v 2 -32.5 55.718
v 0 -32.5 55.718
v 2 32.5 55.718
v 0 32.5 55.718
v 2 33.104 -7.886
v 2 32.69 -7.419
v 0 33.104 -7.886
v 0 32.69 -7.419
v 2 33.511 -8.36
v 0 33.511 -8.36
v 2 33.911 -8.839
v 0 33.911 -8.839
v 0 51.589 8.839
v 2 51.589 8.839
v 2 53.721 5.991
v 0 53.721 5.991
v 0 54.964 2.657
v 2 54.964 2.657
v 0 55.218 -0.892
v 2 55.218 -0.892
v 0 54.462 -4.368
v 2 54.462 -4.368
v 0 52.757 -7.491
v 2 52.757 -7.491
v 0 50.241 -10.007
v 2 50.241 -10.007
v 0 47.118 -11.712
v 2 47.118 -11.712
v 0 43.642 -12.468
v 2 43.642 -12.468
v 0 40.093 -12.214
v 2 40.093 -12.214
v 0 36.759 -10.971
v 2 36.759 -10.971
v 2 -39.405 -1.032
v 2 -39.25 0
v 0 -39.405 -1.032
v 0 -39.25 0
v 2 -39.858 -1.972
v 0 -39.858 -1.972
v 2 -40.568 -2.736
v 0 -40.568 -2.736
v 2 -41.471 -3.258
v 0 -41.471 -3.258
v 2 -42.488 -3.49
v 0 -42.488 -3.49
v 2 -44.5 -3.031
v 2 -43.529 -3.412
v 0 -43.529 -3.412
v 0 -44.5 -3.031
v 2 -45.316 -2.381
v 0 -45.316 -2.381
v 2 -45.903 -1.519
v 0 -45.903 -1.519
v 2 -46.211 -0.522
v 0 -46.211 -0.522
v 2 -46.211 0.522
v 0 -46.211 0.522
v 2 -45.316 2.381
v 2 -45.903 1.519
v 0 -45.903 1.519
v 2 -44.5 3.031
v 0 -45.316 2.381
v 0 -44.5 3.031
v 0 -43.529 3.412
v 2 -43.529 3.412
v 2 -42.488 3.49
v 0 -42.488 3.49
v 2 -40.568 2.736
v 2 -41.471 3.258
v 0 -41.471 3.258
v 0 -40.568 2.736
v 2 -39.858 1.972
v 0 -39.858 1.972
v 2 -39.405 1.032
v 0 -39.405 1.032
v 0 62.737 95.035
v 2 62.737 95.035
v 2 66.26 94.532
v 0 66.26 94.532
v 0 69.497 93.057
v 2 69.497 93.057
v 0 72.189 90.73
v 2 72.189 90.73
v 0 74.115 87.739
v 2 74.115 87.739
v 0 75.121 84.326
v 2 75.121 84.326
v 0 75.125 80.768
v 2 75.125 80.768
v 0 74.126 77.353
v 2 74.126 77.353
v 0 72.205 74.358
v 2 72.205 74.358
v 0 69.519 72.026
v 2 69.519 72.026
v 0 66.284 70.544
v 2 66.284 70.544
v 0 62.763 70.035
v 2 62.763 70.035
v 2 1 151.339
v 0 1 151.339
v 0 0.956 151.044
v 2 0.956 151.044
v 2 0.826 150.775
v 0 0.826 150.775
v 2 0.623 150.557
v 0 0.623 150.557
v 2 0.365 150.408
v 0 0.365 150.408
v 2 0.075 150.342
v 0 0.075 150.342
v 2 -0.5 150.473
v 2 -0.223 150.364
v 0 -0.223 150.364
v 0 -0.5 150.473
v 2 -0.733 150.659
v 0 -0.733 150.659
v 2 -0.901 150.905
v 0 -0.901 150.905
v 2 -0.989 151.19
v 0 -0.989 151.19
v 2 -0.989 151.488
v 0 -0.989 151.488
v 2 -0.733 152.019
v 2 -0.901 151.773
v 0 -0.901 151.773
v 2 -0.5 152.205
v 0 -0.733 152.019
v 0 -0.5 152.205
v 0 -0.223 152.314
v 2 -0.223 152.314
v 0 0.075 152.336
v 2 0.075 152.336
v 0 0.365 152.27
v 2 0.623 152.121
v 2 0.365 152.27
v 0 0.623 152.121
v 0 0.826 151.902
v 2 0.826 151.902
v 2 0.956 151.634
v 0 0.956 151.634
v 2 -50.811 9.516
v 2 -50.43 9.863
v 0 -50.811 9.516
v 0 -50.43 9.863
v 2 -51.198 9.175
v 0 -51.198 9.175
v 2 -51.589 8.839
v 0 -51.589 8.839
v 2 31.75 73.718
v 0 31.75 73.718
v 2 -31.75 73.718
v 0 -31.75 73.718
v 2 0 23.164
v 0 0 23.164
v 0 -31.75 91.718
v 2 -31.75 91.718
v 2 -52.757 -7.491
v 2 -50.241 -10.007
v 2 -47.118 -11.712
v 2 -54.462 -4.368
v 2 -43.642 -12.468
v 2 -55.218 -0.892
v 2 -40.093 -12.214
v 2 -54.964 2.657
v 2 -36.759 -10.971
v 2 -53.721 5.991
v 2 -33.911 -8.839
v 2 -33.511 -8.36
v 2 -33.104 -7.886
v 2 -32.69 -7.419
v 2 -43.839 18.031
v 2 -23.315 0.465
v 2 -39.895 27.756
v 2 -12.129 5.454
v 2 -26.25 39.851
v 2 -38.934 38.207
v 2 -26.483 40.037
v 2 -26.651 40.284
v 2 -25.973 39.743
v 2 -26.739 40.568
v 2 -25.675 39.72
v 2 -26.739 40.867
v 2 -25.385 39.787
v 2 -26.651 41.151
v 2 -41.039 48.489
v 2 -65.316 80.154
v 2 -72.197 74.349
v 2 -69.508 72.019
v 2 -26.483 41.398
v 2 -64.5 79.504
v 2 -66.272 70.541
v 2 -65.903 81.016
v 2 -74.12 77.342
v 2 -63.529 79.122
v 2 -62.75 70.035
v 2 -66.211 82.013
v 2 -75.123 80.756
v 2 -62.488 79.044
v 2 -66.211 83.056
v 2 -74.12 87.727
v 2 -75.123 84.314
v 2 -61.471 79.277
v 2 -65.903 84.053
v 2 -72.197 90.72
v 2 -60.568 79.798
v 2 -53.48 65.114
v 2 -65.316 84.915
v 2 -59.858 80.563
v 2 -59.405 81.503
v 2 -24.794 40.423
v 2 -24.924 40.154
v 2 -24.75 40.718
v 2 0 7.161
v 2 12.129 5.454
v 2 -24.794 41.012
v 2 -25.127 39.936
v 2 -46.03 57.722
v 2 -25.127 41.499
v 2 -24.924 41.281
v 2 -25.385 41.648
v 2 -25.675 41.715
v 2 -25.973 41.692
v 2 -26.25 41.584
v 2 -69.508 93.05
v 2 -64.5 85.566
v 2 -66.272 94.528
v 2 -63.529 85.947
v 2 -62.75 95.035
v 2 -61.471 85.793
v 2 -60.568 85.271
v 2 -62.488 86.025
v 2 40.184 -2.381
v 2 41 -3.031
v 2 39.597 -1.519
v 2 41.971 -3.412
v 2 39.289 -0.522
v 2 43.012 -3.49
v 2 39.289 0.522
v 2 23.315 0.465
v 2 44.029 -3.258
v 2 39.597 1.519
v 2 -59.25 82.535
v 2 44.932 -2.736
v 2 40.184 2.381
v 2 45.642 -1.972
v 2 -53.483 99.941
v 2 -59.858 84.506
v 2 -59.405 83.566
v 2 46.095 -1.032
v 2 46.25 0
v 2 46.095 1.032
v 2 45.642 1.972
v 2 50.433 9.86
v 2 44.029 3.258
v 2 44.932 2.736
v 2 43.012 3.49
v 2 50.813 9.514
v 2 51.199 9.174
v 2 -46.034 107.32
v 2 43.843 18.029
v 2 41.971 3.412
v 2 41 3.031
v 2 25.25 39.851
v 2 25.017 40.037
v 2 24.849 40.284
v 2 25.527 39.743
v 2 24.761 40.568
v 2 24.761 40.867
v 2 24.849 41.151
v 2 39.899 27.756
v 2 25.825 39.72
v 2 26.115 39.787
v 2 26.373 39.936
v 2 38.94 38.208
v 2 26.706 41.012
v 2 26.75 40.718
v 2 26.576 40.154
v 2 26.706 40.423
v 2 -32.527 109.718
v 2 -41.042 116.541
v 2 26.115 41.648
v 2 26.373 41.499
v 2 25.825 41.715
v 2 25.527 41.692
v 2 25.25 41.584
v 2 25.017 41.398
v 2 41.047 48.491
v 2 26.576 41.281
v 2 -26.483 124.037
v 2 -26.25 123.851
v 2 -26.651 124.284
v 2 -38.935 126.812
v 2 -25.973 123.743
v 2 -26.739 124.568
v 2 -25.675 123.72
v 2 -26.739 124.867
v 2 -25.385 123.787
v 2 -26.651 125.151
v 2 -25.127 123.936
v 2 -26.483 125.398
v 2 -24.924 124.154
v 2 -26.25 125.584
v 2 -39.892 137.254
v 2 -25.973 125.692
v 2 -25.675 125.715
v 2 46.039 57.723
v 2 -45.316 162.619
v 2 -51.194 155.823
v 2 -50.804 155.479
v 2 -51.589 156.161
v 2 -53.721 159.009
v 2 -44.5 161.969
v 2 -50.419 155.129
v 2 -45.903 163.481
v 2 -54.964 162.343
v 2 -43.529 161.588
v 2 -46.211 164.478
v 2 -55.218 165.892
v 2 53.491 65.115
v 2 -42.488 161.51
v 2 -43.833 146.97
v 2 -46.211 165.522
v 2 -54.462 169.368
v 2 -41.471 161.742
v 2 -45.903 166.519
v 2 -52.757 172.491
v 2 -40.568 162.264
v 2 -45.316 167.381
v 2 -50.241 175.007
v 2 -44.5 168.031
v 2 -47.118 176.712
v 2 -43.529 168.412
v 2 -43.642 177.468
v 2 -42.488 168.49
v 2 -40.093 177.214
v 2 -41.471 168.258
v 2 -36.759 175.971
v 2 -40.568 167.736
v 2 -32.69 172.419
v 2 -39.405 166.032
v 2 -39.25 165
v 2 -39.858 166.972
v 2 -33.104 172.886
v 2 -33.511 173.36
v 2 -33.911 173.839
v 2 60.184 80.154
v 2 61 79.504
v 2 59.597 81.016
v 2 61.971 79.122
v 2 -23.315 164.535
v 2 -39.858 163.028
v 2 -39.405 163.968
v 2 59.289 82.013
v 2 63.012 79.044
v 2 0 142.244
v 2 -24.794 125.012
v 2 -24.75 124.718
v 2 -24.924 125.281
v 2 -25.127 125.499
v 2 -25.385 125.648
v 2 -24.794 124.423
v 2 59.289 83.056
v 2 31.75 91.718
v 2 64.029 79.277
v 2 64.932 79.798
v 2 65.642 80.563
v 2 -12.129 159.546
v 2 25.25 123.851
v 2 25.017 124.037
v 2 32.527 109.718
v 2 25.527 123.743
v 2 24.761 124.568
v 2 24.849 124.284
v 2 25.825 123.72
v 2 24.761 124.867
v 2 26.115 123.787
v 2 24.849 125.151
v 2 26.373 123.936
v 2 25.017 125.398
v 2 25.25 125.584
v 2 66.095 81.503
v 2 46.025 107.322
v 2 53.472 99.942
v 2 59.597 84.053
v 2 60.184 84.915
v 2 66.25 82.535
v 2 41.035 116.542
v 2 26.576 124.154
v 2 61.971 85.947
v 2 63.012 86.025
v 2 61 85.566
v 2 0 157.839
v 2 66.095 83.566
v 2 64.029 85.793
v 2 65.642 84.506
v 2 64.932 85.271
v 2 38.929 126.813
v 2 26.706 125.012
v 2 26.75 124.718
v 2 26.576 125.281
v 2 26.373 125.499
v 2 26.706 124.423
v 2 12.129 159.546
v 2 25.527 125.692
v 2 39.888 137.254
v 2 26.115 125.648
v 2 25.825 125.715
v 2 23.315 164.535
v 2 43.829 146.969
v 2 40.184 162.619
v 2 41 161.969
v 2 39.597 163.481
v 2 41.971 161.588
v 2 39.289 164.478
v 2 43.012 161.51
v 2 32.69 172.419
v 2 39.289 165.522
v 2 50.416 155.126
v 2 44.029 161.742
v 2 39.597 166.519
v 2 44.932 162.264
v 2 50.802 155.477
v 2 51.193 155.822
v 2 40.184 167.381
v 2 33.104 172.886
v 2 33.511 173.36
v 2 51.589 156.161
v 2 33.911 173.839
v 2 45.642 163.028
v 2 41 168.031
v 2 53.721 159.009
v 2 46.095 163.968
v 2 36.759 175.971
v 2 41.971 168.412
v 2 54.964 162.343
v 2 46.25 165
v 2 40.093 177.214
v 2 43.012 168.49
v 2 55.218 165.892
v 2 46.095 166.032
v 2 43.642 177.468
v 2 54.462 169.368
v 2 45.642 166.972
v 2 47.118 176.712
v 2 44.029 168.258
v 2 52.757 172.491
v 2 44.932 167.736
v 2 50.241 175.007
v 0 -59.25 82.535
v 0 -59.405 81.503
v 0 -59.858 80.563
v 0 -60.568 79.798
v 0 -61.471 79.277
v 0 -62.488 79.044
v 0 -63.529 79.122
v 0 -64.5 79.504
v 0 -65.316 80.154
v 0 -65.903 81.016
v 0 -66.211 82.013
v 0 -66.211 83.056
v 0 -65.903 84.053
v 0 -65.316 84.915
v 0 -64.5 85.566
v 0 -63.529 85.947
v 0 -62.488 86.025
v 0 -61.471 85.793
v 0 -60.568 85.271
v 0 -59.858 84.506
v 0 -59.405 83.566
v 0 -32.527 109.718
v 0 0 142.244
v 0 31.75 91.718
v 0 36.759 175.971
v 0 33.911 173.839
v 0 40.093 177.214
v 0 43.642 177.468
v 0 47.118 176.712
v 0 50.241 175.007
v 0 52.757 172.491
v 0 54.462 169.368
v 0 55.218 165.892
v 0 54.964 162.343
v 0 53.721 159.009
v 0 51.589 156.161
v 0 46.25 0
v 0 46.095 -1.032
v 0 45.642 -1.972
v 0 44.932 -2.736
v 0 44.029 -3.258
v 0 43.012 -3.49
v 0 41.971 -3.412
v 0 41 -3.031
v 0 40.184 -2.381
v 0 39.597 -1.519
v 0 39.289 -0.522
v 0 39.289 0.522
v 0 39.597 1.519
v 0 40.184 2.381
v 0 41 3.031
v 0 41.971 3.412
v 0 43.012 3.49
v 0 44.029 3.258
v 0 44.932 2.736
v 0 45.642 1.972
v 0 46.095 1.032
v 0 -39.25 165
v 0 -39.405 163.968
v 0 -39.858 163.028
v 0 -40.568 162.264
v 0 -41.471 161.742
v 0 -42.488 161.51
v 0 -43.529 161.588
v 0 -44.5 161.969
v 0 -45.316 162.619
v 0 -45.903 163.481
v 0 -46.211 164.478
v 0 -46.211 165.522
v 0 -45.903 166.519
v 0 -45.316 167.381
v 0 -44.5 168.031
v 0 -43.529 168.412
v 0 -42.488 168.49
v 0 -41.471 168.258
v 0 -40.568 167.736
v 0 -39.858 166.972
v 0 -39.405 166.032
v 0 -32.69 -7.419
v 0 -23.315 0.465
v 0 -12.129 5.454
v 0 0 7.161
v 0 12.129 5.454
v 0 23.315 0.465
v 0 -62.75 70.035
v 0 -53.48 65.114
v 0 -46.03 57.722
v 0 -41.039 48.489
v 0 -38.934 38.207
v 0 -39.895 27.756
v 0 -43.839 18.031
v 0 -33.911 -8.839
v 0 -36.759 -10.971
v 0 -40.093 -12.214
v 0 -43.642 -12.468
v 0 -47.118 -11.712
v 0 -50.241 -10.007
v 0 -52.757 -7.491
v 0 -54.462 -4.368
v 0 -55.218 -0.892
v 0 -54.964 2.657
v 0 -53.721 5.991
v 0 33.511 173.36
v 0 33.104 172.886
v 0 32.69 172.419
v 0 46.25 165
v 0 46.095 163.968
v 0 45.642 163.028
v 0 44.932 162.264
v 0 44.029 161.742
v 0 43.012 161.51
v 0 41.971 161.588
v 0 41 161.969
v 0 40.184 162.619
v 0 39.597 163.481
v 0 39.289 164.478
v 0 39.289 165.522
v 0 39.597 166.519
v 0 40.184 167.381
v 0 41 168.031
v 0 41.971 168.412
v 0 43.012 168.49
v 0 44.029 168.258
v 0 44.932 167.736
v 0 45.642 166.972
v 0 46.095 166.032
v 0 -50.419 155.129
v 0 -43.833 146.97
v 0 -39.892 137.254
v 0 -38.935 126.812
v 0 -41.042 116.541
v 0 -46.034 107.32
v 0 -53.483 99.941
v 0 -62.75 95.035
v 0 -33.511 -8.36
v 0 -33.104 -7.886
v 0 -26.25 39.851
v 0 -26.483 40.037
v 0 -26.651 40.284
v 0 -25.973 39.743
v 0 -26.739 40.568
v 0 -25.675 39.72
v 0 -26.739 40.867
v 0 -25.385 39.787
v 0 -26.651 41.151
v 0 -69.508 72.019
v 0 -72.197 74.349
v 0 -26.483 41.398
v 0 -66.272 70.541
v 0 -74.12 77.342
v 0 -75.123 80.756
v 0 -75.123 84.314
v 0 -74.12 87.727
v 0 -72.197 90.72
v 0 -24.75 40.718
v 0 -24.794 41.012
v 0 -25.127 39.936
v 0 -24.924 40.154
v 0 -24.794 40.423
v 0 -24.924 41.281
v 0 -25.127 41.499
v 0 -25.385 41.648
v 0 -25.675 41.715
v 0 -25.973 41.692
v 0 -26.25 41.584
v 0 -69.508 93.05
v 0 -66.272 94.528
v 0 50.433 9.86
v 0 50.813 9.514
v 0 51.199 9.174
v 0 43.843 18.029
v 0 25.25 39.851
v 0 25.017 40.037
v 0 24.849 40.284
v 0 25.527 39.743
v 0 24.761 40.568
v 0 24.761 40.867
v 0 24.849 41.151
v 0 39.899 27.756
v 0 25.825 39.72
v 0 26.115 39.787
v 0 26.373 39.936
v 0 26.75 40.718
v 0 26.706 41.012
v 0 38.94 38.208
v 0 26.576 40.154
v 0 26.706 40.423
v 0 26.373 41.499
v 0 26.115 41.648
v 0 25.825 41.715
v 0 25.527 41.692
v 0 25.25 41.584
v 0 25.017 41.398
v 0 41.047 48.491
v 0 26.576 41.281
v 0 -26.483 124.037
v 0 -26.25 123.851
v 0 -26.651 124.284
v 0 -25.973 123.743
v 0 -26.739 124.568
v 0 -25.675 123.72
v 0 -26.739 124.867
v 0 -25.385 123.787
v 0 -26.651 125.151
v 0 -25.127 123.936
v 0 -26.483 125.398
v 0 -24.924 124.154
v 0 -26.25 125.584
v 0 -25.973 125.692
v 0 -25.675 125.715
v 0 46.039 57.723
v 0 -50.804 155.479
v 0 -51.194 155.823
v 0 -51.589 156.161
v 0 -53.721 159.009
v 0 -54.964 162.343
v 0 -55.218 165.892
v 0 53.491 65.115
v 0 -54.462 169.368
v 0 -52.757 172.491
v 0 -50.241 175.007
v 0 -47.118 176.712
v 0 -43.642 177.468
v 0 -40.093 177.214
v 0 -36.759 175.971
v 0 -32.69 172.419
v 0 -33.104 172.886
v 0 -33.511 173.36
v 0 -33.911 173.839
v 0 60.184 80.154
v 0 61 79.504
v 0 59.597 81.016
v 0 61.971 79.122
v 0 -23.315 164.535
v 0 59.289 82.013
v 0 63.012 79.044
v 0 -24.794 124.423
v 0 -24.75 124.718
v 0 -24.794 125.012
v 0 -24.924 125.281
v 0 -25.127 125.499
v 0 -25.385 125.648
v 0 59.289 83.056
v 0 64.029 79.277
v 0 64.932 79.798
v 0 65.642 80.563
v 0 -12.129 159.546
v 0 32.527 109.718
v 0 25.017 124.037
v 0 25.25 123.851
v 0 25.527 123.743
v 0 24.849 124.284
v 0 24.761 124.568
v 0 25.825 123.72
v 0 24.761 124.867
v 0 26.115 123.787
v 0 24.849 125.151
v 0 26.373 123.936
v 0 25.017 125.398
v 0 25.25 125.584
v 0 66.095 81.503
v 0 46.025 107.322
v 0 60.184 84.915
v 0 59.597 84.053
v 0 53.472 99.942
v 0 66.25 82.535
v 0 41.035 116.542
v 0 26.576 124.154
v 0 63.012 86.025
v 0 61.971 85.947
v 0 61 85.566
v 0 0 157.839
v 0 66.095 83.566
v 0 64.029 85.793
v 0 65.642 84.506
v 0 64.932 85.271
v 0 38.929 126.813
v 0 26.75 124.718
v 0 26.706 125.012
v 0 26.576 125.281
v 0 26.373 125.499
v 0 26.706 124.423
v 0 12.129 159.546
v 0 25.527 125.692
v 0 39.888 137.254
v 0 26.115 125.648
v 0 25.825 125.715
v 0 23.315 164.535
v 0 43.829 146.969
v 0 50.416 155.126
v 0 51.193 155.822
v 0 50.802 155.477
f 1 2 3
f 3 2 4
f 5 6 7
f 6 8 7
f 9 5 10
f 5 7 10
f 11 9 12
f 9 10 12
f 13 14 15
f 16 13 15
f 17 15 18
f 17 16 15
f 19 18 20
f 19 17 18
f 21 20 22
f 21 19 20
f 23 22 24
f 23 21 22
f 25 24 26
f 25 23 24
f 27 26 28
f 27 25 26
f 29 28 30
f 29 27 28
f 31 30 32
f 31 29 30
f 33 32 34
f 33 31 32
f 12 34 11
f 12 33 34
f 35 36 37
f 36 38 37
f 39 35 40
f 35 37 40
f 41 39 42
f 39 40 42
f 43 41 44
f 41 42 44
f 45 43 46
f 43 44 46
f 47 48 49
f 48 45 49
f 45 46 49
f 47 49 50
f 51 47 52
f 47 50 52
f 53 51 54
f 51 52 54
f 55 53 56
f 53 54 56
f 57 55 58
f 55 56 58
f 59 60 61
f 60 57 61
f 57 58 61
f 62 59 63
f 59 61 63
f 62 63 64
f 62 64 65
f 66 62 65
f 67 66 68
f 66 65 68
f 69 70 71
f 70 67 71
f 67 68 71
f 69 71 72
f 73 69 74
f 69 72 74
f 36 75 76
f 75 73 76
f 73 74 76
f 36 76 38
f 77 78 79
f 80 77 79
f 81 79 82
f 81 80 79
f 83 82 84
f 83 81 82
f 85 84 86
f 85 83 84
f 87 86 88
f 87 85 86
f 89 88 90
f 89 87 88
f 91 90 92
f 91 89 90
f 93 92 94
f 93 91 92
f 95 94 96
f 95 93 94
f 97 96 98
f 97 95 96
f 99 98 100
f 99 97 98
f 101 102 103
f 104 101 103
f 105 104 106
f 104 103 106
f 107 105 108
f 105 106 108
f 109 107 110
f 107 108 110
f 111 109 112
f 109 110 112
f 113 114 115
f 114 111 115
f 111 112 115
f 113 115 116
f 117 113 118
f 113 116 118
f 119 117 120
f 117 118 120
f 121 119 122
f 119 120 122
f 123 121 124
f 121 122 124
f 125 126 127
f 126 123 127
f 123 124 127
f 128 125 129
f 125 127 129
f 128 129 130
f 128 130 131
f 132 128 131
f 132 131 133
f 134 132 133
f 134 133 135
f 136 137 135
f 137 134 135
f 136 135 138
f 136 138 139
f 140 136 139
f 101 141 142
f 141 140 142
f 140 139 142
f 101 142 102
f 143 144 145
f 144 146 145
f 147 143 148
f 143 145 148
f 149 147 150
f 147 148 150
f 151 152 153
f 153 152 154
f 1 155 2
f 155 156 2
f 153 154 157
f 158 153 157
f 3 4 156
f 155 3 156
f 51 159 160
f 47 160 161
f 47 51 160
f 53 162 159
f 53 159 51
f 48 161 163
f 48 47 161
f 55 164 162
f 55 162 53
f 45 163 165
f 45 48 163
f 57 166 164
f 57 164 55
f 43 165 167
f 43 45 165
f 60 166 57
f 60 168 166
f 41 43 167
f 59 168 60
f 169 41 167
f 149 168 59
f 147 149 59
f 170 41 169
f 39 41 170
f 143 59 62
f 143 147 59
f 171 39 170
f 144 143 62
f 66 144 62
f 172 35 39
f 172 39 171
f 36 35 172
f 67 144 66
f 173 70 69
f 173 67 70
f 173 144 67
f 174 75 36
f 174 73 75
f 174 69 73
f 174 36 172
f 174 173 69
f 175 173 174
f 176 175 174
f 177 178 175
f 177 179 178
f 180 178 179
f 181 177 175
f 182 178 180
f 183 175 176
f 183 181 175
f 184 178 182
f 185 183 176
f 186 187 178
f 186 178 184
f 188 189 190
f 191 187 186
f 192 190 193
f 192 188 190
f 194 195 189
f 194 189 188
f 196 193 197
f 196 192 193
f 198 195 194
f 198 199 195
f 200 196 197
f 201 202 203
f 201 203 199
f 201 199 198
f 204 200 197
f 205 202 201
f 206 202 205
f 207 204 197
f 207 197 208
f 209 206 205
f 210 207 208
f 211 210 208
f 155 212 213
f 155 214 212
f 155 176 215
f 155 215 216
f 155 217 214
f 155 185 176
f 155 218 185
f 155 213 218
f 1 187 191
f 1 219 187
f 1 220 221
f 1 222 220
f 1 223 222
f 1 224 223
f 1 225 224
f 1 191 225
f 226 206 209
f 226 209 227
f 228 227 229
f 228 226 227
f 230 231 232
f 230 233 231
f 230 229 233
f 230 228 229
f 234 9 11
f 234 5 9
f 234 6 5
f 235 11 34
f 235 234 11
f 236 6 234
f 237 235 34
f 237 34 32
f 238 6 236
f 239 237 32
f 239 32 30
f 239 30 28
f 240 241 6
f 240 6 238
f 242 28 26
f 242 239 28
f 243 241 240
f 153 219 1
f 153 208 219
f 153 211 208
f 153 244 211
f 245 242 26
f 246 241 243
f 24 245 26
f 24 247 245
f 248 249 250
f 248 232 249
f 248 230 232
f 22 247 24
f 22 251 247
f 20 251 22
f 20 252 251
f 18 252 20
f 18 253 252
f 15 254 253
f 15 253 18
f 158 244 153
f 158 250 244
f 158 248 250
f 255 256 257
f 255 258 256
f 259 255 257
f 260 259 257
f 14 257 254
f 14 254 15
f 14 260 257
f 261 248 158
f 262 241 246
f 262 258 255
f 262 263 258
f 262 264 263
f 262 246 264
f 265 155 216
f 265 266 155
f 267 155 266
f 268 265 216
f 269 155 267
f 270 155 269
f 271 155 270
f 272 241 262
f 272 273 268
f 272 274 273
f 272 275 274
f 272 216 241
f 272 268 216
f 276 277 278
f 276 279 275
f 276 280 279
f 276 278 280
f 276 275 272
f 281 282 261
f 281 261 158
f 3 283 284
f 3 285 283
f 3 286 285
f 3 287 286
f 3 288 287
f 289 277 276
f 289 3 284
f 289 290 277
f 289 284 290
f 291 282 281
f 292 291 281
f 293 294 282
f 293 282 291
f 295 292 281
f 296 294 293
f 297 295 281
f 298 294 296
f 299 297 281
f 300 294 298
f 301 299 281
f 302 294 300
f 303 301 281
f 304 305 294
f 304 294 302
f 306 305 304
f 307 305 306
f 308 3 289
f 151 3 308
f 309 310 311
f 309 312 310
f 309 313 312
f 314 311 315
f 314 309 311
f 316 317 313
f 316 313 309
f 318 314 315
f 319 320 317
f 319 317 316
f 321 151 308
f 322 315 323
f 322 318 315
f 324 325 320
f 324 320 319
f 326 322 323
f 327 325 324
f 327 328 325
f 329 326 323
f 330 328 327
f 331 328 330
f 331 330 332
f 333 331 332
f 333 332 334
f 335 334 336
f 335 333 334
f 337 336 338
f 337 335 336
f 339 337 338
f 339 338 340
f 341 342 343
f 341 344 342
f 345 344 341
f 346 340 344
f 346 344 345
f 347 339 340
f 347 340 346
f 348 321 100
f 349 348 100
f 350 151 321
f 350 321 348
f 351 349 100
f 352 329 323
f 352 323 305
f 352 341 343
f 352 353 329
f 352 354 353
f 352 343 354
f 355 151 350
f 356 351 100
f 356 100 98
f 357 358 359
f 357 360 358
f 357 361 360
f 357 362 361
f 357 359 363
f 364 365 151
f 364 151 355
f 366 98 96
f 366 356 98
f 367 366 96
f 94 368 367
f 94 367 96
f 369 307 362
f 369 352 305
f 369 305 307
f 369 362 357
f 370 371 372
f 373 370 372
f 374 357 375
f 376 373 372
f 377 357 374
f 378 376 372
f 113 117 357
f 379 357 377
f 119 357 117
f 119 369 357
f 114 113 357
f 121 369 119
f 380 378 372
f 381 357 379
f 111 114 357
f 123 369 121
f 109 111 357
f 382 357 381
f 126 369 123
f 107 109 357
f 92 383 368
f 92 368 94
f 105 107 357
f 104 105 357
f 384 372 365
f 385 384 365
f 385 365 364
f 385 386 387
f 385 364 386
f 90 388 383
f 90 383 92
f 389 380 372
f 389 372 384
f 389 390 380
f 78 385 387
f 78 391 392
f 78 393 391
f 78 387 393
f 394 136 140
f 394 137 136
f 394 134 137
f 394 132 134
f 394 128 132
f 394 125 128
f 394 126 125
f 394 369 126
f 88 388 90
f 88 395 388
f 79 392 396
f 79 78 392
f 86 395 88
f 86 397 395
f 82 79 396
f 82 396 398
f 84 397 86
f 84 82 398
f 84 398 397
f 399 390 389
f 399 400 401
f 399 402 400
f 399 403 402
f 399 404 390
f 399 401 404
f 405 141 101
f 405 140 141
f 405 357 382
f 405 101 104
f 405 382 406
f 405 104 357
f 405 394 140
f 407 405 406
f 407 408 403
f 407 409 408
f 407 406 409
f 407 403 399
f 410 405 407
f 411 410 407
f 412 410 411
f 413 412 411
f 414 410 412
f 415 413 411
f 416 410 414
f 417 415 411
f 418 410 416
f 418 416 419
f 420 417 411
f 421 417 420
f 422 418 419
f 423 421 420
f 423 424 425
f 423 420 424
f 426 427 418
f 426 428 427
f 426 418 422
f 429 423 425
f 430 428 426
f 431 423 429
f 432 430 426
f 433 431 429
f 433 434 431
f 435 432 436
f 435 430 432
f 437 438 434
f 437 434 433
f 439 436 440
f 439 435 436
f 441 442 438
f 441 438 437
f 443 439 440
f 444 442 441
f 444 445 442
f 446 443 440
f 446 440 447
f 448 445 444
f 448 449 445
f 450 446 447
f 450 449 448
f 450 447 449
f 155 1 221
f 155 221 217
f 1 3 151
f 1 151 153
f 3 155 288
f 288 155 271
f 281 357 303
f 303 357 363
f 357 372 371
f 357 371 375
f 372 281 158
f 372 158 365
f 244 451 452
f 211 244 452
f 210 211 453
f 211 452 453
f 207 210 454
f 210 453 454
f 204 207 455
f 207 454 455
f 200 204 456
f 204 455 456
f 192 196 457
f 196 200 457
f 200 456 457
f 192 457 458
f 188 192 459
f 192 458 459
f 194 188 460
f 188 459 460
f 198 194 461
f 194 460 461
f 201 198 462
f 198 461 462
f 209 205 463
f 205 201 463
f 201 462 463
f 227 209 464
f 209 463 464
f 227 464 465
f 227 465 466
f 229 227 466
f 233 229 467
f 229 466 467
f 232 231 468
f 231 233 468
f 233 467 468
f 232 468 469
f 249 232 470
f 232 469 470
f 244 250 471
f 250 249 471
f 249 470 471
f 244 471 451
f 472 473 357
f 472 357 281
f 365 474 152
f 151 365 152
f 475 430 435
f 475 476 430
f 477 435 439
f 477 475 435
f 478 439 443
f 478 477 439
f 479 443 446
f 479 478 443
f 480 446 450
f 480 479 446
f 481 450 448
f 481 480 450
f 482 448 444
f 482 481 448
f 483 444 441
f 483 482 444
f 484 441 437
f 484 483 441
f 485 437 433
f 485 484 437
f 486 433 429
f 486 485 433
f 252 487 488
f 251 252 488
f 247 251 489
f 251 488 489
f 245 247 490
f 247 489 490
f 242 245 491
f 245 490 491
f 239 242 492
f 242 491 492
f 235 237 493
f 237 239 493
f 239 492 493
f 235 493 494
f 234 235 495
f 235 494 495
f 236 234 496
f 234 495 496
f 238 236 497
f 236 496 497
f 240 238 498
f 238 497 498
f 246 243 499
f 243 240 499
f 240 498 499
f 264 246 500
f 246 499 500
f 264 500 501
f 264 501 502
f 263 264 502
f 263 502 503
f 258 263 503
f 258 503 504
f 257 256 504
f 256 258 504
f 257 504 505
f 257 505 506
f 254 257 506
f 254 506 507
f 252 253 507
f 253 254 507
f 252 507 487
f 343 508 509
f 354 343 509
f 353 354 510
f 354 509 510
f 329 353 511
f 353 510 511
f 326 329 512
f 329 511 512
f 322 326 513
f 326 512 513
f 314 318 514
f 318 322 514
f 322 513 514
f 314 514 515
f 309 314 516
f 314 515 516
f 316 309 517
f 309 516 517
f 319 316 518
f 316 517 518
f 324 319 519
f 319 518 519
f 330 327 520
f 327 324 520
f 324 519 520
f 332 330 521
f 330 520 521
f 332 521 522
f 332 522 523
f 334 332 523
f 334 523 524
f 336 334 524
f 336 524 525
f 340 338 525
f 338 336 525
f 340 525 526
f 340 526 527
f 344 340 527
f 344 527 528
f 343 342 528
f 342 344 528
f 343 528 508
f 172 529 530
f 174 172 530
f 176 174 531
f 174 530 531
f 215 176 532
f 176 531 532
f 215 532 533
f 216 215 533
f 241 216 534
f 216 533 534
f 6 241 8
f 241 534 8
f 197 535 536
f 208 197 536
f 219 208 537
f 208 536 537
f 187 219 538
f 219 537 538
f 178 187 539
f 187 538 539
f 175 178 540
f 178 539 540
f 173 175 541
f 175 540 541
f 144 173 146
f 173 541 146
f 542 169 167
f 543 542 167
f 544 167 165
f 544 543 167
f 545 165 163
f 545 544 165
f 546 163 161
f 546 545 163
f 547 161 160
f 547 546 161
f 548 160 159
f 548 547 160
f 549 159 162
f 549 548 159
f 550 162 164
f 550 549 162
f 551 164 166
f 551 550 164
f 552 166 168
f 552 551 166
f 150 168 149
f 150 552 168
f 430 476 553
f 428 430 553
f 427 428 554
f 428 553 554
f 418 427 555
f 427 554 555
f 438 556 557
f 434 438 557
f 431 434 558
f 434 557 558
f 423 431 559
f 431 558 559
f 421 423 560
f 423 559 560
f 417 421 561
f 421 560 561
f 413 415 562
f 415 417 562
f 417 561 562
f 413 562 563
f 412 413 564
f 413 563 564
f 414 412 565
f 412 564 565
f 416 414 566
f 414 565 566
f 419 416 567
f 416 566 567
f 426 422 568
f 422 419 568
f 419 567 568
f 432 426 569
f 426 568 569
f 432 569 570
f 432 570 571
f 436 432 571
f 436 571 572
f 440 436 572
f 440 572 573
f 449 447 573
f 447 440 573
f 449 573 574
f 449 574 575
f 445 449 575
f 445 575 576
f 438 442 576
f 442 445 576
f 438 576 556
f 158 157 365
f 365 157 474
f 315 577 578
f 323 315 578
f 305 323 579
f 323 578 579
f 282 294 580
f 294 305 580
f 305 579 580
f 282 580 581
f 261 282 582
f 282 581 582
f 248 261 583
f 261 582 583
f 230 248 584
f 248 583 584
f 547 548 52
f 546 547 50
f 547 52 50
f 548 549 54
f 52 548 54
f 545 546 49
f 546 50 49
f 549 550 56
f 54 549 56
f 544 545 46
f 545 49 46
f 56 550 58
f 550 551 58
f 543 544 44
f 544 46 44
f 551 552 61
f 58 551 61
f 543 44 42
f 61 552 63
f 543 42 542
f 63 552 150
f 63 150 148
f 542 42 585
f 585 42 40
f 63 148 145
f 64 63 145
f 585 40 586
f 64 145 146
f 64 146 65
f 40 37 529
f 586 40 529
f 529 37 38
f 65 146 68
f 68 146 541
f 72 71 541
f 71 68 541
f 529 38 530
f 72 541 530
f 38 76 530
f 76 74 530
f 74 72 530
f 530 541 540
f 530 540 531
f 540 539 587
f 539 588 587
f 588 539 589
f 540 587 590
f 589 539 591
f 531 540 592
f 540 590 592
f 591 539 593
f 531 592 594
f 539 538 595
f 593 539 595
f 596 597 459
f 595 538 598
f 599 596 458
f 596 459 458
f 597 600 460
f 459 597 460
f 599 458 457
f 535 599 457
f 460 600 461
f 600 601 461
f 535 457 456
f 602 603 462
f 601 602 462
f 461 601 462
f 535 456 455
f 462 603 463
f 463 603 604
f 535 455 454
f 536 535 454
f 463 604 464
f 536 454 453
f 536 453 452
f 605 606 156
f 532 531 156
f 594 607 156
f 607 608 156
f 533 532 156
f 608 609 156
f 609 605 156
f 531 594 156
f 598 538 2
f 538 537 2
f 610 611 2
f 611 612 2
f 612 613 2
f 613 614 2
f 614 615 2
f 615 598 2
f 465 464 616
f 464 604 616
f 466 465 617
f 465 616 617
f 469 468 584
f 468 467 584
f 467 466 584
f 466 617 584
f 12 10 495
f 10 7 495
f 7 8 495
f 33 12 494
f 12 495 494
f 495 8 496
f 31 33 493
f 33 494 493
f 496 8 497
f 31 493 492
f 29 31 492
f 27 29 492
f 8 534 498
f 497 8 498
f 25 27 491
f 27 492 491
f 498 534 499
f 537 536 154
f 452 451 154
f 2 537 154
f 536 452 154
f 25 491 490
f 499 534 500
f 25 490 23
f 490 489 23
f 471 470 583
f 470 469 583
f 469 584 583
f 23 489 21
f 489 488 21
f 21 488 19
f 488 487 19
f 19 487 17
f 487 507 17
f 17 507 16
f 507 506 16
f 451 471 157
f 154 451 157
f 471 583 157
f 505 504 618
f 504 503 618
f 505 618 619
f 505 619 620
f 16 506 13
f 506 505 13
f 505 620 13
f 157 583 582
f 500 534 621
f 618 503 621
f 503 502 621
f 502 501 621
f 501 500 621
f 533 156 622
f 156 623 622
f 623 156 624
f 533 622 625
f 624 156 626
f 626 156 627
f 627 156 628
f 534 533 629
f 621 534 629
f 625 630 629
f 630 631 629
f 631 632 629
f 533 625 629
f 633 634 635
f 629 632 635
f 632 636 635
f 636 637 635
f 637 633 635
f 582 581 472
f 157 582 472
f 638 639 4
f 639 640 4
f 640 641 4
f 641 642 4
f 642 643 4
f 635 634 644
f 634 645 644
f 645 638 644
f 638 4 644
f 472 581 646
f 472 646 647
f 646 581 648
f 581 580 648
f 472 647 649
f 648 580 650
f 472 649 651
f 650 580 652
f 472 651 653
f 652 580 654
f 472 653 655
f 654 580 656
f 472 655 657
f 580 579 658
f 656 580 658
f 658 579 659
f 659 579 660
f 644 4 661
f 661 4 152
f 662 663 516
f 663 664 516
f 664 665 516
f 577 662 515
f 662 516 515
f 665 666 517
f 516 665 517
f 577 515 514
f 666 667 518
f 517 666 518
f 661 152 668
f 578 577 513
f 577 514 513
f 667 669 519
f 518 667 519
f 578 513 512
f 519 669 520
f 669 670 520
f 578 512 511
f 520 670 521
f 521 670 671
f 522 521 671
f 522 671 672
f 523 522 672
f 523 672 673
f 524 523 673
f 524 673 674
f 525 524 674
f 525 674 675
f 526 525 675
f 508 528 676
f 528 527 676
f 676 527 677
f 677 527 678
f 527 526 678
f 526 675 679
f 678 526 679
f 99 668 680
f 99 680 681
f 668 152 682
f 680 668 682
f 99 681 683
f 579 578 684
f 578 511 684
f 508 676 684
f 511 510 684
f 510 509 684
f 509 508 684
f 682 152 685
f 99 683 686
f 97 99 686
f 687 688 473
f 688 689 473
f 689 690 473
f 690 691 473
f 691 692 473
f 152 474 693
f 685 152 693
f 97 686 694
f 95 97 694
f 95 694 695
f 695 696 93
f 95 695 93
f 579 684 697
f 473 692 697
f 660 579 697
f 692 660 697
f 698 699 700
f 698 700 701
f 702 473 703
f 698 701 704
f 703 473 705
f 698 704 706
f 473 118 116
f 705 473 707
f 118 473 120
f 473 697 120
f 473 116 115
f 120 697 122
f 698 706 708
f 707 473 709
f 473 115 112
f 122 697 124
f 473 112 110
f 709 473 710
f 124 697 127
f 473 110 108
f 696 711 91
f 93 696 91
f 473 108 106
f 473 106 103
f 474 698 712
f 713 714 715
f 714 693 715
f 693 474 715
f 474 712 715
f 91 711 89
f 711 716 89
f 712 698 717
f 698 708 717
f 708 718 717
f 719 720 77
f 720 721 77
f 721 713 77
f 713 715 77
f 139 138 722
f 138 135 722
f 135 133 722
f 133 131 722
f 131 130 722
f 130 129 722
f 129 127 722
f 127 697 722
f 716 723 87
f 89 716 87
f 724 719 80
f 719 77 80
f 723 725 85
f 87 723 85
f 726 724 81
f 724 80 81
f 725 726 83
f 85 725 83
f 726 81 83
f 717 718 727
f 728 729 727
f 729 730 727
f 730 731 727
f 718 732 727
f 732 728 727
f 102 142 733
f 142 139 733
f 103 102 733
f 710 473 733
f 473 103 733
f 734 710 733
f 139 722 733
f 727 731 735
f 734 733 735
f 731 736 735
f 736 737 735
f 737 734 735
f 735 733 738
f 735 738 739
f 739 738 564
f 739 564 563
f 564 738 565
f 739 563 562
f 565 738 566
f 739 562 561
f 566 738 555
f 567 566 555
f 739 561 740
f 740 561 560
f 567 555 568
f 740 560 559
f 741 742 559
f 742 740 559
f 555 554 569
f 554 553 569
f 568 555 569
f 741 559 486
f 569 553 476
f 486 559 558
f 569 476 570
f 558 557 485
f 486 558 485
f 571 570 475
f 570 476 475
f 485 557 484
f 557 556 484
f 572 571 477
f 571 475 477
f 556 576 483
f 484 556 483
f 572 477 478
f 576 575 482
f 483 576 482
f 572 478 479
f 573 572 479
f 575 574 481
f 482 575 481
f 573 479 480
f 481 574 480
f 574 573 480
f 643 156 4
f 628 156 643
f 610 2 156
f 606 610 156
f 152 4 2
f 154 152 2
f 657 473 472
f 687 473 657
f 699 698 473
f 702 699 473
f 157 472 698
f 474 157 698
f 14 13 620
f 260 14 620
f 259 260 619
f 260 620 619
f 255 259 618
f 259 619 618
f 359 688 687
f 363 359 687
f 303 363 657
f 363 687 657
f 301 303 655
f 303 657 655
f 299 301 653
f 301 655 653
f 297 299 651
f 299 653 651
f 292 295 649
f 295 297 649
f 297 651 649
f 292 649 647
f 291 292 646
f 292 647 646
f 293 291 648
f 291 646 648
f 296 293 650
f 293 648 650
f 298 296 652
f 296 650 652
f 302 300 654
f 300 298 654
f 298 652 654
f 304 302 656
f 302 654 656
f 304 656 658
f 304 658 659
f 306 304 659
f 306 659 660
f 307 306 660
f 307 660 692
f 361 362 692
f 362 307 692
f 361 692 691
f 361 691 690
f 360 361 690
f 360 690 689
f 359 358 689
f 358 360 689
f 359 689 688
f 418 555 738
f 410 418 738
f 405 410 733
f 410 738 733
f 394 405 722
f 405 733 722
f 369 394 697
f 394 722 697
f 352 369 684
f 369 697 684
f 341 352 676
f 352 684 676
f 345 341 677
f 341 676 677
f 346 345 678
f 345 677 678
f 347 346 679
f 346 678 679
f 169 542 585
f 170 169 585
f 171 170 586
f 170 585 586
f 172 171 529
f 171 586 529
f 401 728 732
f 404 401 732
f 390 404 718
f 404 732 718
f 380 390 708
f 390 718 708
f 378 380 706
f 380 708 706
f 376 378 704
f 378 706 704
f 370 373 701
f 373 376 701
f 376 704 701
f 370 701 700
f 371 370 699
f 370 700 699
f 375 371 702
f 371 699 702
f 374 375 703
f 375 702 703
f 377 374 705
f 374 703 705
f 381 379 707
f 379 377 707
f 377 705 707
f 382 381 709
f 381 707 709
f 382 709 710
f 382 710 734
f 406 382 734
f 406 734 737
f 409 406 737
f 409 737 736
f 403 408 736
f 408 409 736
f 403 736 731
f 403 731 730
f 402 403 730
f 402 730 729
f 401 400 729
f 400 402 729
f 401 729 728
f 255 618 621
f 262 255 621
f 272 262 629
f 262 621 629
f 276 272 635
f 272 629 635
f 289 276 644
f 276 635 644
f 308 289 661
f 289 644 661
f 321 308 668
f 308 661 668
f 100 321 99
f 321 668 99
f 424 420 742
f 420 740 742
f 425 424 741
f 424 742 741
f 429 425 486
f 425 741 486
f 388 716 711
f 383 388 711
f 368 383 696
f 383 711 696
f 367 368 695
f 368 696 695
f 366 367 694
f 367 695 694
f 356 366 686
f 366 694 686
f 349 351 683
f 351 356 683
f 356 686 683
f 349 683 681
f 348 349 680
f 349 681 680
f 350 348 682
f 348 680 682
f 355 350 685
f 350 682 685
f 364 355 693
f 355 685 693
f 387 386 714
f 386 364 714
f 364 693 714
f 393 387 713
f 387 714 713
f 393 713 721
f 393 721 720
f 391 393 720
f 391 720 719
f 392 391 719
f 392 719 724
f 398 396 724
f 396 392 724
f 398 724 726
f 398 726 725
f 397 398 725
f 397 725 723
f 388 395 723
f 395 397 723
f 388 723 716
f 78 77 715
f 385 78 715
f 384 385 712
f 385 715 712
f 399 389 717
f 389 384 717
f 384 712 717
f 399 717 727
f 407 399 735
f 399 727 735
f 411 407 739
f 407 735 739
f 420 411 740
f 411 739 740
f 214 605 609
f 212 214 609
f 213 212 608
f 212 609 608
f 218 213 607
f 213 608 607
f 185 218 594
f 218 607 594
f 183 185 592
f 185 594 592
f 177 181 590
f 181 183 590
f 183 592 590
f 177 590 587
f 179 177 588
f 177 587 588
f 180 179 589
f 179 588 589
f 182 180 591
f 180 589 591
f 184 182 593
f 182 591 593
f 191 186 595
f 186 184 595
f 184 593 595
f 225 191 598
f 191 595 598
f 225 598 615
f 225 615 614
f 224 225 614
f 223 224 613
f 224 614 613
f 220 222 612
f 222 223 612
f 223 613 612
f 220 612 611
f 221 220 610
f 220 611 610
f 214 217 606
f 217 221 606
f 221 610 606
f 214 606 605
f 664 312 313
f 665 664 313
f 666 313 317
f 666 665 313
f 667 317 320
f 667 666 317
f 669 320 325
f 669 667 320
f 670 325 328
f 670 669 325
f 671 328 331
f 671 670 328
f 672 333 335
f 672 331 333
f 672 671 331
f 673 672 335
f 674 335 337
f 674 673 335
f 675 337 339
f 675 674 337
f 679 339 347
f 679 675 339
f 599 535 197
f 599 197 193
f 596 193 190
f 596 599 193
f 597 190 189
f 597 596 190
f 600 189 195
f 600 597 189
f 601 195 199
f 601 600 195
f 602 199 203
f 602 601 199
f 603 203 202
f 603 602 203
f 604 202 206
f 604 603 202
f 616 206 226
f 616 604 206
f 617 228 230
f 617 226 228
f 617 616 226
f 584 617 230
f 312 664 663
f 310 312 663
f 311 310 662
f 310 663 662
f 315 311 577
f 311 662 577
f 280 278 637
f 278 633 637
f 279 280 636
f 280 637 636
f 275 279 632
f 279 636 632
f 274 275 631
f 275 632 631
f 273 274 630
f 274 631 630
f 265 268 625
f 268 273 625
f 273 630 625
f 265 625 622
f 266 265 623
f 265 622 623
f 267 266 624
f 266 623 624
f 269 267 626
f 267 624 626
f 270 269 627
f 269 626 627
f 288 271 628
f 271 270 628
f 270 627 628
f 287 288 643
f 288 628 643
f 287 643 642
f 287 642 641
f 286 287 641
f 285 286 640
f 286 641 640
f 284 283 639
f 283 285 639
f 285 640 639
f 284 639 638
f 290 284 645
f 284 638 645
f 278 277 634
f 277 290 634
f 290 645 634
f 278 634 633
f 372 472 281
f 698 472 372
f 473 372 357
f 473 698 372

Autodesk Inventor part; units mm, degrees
ref_plane "YZ Plane" through (0, 0, 0) normal (1, 0, 0) x (0, 1, 0)
ref_plane "XZ Plane" through (0, 0, 0) normal (0, 1, 0) x (-1, 0, 0)
ref_plane "XY Plane" through (0, 0, 0) normal (0, 0, 1) x (1, 0, 0)
sketch "Sketch1" plane through (0, 0, 0) normal (1, 0, 0) x (0, 1, 0)
  line L0 (-42.75, 165) -> (42.75, 165) construction
  line L1 (42.75, 165) -> (42.75, 0) construction
  line L2 (42.75, 0) -> (-42.75, 0) construction
  line L3 (-42.75, 0) -> (-42.75, 165) construction
  arc A0 (-32.6897, 172.419) -> (-50.4192, 155.1291) centre (-42.75, 165) ccw
  arc A1 (50.4158, 155.1265) -> (32.6897, 172.419) centre (42.75, 165) ccw
  arc A2 (-50.4296, 9.8627) -> (-32.6897, -7.419) centre (-42.75, 0) ccw
  arc A3 (32.6897, -7.419) -> (50.433, 9.8601) centre (42.75, 0) ccw
  line L4 (0, 0) -> (0, 165) construction
  line L5 (-19.1029, 0) -> (-19.1029, 82.5) construction
  line L6 (-42.75, 82.5346) -> (42.75, 82.5346) construction
  line L7 (-42.75, 82.5346) -> (-62.75, 82.5346) construction
  line L8 (42.75, 82.5346) -> (62.75, 82.5346) construction
  arc A4 (-62.75, 95.0346) -> (-62.75, 70.0346) centre (-62.75, 82.5346) ccw
  arc A5 (62.7626, 70.0346) -> (62.7374, 95.0346) centre (62.75, 82.5346) ccw
  circle A6 centre (-62.75, 82.5346) radius 3.5
  circle A7 centre (62.75, 82.5346) radius 3.5
  circle A8 centre (-42.75, 165) radius 3.5
  circle A9 centre (42.75, 165) radius 3.5
  circle A10 centre (-42.75, 0) radius 3.5
  circle A11 centre (42.75, 0) radius 3.5
  line L9 (42.75, 165) -> (33.9112, 173.8388) construction
  line L10 (-42.75, 165) -> (-33.9112, 173.8388) construction
  line L11 (42.75, 165) -> (51.5888, 156.1612) construction
  line L12 (-42.75, 165) -> (-51.5888, 156.1612) construction
  line L13 (-42.75, 0) -> (-51.5888, 8.8388) construction
  line L14 (-42.75, 0) -> (-33.9112, -8.8388) construction
  line L15 (42.75, 0) -> (33.9112, -8.8388) construction
  line L16 (42.75, 0) -> (51.5888, 8.8388) construction
  line L17 (-62.75, 82.5346) -> (-62.75, 95.0346) construction
  line L18 (-62.75, 82.5346) -> (-62.75, 70.0346) construction
  line L19 (62.75, 82.5346) -> (62.7374, 95.0346) construction
  line L20 (62.75, 82.5346) -> (62.7626, 70.0346) construction
  line L21 (-51.5888, 156.1612) -> (-62.75, 95.0346) construction
  line L22 (-33.9112, 173.8388) -> (33.9112, 173.8388) construction
  line L23 (51.5888, 156.1612) -> (62.7374, 95.0346) construction
  line L24 (62.7626, 70.0346) -> (51.5888, 8.8388) construction
  line L25 (33.9112, -8.8388) -> (-33.9112, -8.8388) construction
  line L26 (-51.5888, 8.8388) -> (-62.75, 70.0346) construction
  line L27 (-57.1694, 125.5979) -> (-39.4622, 122.3647) construction
  line L28 (57.1631, 125.5979) -> (39.4552, 122.3682) construction
  line L29 (-57.1694, 39.4367) -> (-39.4615, 42.6664) construction
  line L30 (57.1757, 39.4367) -> (39.4685, 42.6699) construction
  line L31 (0, -8.8388) -> (0, 7.1612)
  arc A12 (-33.9112, 173.8388) -> (33.9112, 173.8388) centre (0, 201.7753) ccw
  arc A13 (-62.75, 95.0346) -> (-51.5888, 156.1612) centre (-74.6924, 128.7974) ccw
  arc A14 (-51.5888, 8.8388) -> (-62.75, 70.0346) centre (-74.7509, 36.2301) ccw
  arc A15 (62.7626, 70.0346) -> (51.5888, 8.8388) centre (74.7585, 36.2263) ccw
  arc A16 (33.9112, -8.8388) -> (-33.9112, -8.8388) centre (0, -36.7753) ccw
  arc A17 (51.5888, 156.1612) -> (62.7374, 95.0346) centre (74.6848, 128.7936) ccw
  line L32 (-42.75, 99.1738) -> (-31.75, 99.1738) construction
  line L33 (42.75, 99.1738) -> (31.75, 99.1738) construction
  line L34 (0, 157.8388) -> (0, 7.1612) construction
  line L35 (-25.75, 165) -> (-25.75, 103.3033) construction
  line L36 (-31.75, 91.7175) -> (31.75, 91.7175)
  line L37 (31.75, 91.7175) -> (31.75, 73.7175)
  line L38 (31.75, 73.7175) -> (-31.75, 73.7175)
  line L39 (-31.75, 73.7175) -> (-31.75, 91.7175)
  line L40 (0, 142.2444) -> (-32.5269, 109.7175)
  line L41 (-32.5269, 109.7175) -> (32.5269, 109.7175)
  line L42 (32.5269, 109.7175) -> (0, 142.2444)
  line L43 (0, 23.1637) -> (-32.5, 55.7175)
  line L44 (-32.5, 55.7175) -> (32.5, 55.7175)
  line L45 (32.5, 55.7175) -> (0, 23.1637)
  circle A18 centre (0, 151.3388) radius 1
  circle A19 centre (25.75, 124.7175) radius 1
  circle A20 centre (-25.75, 124.7175) radius 1
  circle A21 centre (-25.75, 40.7175) radius 1
  circle A22 centre (25.75, 40.7175) radius 1
  dimension "d0" = 165
  dimension "d1" = 85.5
  dimension "d2" = 82.5
  dimension "d3" = 20
  dimension "d4" = 20
  dimension "d5" = 25
  dimension "d6" = 25
  dimension "d7" = 25
  dimension "d8" = 25
  dimension "d9" = 25
  dimension "d10" = 25
  dimension "d11" = 7
  dimension "d12" = 7
  dimension "d13" = 7
  dimension "d14" = 7
  dimension "d15" = 7
  dimension "d16" = 7
  dimension "d17" = 45
  dimension "d18" = 45
  dimension "d19" = 45
  dimension "d20" = 45
  dimension "d21" = 45
  dimension "d22" = 45
  dimension "d23" = 45
  dimension "d24" = 90
  dimension "d26" = 16
  dimension "d27" = 11
  dimension "d28" = 11
  dimension "d29" = 150.6777
  dimension "d30" = 61.6967
  dimension "d31" = 63.5
  dimension "d32" = 18
  dimension "d33" = 73.2825
  dimension "d34" = 31
  dimension "d35" = 46
  dimension "d36" = 46
  dimension "d37" = 65.0538
  dimension "d38" = 18
  dimension "d39" = 65
  dimension "d40" = 46
  dimension "d41" = 46
  dimension "d42" = 18
  dimension "d43" = 2
  dimension "d44" = 6.5
  dimension "d45" = 2
  dimension "d46" = 2
  dimension "d47" = 33
  dimension "d48" = 17
  dimension "d49" = 17
  dimension "d50" = 33
  dimension "d51" = 2
  dimension "d52" = 2
  dimension "d53" = 33
  dimension "d54" = 33
  dimension "d55" = 17
  dimension "d56" = 17
extrude "Extrusion1" add sketch "Sketch1" along normal blind 2 contours A12 A1 A17 A5 A15 A3 A16 A2 A14 A4 A13 A0
properties part number "BaseBawah"
